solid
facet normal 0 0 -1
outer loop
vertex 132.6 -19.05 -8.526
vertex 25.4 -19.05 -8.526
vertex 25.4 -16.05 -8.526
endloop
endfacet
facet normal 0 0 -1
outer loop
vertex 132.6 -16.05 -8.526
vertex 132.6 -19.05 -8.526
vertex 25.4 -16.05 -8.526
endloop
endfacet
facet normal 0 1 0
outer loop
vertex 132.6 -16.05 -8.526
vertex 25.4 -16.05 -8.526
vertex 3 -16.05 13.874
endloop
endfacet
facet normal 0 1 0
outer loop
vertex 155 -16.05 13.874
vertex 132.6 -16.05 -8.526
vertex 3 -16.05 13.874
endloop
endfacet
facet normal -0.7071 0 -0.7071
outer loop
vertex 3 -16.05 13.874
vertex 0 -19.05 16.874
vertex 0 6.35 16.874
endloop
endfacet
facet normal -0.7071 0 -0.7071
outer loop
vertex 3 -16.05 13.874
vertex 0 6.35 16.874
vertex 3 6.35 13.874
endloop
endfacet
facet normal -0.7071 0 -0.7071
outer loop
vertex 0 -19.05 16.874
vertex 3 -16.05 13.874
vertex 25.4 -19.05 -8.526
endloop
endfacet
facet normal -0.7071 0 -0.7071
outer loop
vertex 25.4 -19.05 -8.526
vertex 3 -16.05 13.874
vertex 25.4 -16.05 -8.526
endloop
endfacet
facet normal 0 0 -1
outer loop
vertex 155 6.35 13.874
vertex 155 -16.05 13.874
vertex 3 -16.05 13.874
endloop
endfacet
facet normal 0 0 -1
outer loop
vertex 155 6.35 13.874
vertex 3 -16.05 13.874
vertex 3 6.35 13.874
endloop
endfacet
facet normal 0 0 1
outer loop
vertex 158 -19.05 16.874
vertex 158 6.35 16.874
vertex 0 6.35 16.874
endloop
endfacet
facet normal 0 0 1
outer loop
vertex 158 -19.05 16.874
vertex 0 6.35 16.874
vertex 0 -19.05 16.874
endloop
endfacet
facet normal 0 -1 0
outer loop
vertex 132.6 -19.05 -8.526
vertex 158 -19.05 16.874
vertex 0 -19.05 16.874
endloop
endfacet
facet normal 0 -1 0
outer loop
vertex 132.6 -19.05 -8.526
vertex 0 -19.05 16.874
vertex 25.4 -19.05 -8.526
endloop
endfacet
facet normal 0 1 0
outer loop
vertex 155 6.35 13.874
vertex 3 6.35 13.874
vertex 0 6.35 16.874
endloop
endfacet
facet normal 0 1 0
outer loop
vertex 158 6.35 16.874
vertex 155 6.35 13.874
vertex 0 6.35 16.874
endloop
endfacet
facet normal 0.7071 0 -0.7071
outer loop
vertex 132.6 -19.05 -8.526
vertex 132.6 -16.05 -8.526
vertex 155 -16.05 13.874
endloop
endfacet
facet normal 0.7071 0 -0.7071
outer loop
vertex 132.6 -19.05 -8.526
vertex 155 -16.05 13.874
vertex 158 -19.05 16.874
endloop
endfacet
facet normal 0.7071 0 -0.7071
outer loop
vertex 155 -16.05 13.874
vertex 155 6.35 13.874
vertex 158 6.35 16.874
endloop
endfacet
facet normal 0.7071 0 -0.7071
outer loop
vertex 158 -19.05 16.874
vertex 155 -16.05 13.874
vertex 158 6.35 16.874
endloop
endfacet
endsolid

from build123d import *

# Parameters (mm, degrees)
SALIENTE_EXTRUIR1_DEPTH = 158
CORTAR_EXTRUIR3_DEPTH   = 105
CORTAR_EXTRUIR4_DEPTH   = 105


with BuildPart() as part:
    # Croquis1 → Saliente-Extruir1 (new body)
    with BuildSketch(Plane(origin=(0, 0, 0), x_dir=(0, 0, -1), z_dir=(1, 0, 0))):
        Polygon((-16.874298957, 6.35), (-16.874298957, -19.05), (8.525701043, -19.05), (8.525701043, -16.05), (-13.874298957, -16.05), (-13.874298957, 6.35), align=None)
    extrude(amount=SALIENTE_EXTRUIR1_DEPTH)

    # Croquis3 → Cortar-Extruir3 (cut)
    with BuildSketch(Plane(origin=(0, 6.35, 0), x_dir=(1, 0, 0), z_dir=(0, 1, 0))):
        Polygon((0, -16.874298957), (25.4, 8.525701043), (0, 8.525701043), align=None)
    extrude(amount=-CORTAR_EXTRUIR3_DEPTH, mode=Mode.SUBTRACT)

    # Croquis4 → Cortar-Extruir4 (cut)
    with BuildSketch(Plane(origin=(0, 6.35, 0), x_dir=(1, 0, 0), z_dir=(0, 1, 0))):
        Polygon((158, -16.874298957), (158, 8.525701043), (132.6, 8.525701043), align=None)
    extrude(amount=-CORTAR_EXTRUIR4_DEPTH, mode=Mode.SUBTRACT)


solid = part.part
